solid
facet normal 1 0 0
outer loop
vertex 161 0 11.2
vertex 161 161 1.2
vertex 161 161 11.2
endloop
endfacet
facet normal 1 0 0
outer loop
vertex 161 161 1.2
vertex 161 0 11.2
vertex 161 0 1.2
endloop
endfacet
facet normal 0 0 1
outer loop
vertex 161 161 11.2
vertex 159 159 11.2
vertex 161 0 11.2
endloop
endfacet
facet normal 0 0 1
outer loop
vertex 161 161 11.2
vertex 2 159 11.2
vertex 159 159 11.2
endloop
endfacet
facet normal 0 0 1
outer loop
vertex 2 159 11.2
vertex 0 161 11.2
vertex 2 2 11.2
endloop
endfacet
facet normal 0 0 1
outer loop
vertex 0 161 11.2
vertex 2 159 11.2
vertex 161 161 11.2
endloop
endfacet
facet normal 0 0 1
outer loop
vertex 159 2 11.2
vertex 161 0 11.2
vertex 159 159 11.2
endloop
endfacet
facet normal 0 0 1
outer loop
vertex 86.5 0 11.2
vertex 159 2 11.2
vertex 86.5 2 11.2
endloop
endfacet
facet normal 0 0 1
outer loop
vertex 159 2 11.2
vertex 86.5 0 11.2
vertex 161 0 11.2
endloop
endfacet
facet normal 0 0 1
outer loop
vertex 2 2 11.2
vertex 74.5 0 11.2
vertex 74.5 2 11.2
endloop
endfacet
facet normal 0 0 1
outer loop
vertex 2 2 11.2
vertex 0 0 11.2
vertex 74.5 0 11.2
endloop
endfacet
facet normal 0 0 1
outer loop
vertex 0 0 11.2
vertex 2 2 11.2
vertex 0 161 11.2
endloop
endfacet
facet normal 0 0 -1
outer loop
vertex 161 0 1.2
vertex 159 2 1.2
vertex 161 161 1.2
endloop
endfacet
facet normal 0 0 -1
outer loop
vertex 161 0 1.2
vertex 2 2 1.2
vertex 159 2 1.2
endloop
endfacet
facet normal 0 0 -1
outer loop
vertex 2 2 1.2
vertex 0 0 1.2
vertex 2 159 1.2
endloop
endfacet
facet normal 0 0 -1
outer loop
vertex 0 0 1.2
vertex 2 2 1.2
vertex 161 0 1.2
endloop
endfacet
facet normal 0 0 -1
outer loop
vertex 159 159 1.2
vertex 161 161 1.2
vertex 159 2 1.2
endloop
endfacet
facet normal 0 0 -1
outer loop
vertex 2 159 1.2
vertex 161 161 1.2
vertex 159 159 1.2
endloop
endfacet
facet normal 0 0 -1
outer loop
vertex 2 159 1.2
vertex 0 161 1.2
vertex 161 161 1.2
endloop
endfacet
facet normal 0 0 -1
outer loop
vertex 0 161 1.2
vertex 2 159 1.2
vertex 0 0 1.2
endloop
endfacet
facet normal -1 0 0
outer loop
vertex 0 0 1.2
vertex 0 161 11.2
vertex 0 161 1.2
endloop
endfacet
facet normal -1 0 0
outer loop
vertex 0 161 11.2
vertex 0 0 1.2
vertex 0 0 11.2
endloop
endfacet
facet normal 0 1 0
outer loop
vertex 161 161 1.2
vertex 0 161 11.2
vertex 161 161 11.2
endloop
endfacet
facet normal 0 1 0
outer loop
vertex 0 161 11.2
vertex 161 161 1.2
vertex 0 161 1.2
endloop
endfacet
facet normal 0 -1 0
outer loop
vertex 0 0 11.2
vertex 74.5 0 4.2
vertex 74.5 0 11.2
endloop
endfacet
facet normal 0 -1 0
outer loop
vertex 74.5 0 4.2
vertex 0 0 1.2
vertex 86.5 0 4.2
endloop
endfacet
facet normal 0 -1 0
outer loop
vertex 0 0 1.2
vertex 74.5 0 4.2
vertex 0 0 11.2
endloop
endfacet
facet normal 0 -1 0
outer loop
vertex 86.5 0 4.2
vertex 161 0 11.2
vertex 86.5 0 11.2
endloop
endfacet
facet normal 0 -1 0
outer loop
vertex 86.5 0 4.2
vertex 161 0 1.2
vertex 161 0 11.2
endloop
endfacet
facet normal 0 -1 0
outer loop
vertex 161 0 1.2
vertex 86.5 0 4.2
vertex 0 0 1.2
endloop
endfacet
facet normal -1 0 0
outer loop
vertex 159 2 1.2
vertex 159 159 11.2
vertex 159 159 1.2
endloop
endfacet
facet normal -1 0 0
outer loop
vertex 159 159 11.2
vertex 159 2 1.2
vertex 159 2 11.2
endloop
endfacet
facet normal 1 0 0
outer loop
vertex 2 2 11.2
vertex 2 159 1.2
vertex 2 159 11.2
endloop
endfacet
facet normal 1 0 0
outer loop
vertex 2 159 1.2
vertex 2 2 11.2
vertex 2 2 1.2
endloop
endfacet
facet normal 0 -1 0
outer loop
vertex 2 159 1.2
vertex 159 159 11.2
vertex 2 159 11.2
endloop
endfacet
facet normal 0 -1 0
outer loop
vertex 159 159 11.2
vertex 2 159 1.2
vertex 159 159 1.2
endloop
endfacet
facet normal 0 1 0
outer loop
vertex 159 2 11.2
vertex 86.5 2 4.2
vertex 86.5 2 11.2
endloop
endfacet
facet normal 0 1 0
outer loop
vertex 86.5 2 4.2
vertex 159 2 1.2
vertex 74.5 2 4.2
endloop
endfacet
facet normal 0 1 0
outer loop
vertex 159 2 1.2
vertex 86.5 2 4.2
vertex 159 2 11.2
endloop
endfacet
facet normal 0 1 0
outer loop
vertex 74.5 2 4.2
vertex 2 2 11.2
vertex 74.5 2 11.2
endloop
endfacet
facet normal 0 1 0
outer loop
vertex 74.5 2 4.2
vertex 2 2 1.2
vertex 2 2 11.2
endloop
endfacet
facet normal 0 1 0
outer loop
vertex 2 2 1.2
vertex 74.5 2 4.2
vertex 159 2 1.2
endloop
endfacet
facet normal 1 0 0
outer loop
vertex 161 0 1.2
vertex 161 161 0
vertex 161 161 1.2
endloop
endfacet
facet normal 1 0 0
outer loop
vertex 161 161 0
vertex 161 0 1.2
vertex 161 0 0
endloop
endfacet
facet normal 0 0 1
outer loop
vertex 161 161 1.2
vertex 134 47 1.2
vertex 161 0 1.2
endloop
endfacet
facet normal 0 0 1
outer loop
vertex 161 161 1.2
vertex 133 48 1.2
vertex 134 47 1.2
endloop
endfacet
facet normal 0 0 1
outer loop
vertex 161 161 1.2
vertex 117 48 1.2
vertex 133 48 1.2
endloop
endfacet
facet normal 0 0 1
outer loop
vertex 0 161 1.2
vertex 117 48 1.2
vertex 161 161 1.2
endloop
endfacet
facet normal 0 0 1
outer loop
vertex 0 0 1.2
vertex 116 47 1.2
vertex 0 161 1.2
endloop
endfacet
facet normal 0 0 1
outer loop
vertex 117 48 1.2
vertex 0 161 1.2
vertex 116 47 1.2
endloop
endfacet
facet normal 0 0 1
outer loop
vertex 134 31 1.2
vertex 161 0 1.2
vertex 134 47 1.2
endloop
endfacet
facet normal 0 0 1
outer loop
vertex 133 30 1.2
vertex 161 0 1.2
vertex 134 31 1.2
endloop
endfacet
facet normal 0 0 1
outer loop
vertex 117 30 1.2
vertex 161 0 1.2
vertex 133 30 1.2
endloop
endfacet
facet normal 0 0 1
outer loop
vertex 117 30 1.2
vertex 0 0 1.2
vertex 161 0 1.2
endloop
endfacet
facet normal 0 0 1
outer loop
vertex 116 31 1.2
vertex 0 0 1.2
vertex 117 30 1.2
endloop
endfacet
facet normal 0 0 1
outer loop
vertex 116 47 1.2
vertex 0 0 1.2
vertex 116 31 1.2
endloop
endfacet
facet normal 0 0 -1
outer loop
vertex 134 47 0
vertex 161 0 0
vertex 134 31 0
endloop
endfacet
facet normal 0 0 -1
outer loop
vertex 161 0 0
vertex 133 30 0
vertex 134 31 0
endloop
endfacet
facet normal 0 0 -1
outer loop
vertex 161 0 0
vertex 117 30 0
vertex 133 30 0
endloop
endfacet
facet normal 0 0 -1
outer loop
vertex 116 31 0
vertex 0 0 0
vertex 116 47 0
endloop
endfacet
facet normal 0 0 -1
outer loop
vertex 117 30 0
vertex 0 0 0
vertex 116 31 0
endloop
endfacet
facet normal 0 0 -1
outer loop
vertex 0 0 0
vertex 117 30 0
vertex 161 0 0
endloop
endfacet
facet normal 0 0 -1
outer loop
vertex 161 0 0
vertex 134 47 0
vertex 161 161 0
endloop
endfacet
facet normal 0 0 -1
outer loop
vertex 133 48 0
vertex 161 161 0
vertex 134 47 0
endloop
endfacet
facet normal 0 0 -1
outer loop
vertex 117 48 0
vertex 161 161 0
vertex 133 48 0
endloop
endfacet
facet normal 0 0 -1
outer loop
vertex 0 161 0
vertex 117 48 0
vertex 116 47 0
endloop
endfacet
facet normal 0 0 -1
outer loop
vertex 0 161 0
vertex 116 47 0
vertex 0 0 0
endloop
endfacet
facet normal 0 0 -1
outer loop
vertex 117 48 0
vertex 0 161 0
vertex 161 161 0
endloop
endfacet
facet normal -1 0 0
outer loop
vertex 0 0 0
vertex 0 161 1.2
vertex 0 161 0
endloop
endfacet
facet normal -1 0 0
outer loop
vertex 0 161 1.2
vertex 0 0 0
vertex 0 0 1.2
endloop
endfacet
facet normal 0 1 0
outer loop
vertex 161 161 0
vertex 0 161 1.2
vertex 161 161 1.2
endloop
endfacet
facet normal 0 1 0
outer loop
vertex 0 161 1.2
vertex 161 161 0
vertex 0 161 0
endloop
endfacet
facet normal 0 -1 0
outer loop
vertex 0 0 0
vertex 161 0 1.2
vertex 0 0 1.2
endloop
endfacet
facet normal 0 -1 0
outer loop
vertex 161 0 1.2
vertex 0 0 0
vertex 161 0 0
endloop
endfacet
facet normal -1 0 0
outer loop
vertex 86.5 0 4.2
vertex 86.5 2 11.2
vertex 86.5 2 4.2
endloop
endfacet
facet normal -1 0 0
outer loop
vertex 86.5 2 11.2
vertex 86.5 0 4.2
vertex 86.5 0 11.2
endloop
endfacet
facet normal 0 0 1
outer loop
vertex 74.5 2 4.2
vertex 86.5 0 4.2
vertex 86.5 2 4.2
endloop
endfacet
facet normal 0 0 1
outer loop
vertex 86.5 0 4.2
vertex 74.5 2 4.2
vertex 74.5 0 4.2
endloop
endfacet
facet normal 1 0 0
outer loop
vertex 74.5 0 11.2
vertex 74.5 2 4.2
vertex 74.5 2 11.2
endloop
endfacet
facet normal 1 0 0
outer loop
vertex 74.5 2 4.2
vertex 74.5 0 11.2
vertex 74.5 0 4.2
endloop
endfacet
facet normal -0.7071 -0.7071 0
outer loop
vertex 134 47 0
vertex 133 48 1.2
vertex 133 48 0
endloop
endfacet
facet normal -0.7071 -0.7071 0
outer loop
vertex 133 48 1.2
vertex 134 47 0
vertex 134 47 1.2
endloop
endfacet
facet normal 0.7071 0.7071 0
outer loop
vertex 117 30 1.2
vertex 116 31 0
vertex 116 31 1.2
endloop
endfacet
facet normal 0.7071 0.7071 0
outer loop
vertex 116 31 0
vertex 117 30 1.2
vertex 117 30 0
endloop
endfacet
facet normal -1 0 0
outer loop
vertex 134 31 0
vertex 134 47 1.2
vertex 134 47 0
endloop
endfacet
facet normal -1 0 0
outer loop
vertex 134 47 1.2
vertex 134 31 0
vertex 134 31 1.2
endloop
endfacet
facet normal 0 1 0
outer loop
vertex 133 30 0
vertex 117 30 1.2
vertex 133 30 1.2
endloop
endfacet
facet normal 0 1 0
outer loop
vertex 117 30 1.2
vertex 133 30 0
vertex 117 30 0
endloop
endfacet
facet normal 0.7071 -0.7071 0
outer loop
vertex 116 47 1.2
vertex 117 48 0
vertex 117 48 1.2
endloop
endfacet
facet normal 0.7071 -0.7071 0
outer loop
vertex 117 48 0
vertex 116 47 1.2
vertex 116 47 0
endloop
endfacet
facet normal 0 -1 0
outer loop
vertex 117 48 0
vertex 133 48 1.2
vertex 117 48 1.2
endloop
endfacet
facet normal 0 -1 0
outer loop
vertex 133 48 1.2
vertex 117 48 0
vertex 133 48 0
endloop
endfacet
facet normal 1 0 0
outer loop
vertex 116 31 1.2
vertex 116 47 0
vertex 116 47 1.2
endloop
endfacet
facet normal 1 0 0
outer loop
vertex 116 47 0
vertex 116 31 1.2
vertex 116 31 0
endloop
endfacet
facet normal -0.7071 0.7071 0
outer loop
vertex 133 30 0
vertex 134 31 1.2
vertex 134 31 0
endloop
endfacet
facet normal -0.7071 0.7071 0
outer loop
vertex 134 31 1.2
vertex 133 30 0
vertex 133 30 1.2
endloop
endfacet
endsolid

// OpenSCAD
// Rear / inner part with USB notch and LED wiring opening.
// All dimensions are in millimetres.

outer_size = 161;
base_thickness = 1.2;
wall_thickness = 2;
wall_rise = 10;
overall_height = base_thickness + wall_rise;

usb_width = 12;
usb_depth = 7;
usb_center_x = outer_size / 2; // 80.5 mm

led_hole_size = 18;
led_corner_radius = 1;
led_center_x = 125;
led_center_y = 39; // measured from the USB-notch / bottom edge

module rounded_square_hole(size, radius, height) {
    linear_extrude(height=height)
        offset(r=radius)
            square([size - 2 * radius, size - 2 * radius], center=true);
}

difference() {
    union() {
        cube([outer_size, outer_size, base_thickness]);

        translate([0, 0, base_thickness])
            difference() {
                cube([outer_size, outer_size, wall_rise]);
                translate([wall_thickness, wall_thickness, 0])
                    cube([
                        outer_size - 2 * wall_thickness,
                        outer_size - 2 * wall_thickness,
                        wall_rise
                    ]);
            }
    }

    // U-shaped USB opening, centred on the bottom/front wall.
    translate([
        usb_center_x - usb_width / 2,
        -0.1,
        overall_height - usb_depth
    ])
        cube([usb_width, wall_thickness + 0.2, usb_depth + 0.1]);

    // Through-hole exposing the LED 5V / GND / DIN pad and its wires.
    translate([led_center_x, led_center_y, -0.1])
        rounded_square_hole(
            led_hole_size,
            led_corner_radius,
            base_thickness + 0.2
        );
}
